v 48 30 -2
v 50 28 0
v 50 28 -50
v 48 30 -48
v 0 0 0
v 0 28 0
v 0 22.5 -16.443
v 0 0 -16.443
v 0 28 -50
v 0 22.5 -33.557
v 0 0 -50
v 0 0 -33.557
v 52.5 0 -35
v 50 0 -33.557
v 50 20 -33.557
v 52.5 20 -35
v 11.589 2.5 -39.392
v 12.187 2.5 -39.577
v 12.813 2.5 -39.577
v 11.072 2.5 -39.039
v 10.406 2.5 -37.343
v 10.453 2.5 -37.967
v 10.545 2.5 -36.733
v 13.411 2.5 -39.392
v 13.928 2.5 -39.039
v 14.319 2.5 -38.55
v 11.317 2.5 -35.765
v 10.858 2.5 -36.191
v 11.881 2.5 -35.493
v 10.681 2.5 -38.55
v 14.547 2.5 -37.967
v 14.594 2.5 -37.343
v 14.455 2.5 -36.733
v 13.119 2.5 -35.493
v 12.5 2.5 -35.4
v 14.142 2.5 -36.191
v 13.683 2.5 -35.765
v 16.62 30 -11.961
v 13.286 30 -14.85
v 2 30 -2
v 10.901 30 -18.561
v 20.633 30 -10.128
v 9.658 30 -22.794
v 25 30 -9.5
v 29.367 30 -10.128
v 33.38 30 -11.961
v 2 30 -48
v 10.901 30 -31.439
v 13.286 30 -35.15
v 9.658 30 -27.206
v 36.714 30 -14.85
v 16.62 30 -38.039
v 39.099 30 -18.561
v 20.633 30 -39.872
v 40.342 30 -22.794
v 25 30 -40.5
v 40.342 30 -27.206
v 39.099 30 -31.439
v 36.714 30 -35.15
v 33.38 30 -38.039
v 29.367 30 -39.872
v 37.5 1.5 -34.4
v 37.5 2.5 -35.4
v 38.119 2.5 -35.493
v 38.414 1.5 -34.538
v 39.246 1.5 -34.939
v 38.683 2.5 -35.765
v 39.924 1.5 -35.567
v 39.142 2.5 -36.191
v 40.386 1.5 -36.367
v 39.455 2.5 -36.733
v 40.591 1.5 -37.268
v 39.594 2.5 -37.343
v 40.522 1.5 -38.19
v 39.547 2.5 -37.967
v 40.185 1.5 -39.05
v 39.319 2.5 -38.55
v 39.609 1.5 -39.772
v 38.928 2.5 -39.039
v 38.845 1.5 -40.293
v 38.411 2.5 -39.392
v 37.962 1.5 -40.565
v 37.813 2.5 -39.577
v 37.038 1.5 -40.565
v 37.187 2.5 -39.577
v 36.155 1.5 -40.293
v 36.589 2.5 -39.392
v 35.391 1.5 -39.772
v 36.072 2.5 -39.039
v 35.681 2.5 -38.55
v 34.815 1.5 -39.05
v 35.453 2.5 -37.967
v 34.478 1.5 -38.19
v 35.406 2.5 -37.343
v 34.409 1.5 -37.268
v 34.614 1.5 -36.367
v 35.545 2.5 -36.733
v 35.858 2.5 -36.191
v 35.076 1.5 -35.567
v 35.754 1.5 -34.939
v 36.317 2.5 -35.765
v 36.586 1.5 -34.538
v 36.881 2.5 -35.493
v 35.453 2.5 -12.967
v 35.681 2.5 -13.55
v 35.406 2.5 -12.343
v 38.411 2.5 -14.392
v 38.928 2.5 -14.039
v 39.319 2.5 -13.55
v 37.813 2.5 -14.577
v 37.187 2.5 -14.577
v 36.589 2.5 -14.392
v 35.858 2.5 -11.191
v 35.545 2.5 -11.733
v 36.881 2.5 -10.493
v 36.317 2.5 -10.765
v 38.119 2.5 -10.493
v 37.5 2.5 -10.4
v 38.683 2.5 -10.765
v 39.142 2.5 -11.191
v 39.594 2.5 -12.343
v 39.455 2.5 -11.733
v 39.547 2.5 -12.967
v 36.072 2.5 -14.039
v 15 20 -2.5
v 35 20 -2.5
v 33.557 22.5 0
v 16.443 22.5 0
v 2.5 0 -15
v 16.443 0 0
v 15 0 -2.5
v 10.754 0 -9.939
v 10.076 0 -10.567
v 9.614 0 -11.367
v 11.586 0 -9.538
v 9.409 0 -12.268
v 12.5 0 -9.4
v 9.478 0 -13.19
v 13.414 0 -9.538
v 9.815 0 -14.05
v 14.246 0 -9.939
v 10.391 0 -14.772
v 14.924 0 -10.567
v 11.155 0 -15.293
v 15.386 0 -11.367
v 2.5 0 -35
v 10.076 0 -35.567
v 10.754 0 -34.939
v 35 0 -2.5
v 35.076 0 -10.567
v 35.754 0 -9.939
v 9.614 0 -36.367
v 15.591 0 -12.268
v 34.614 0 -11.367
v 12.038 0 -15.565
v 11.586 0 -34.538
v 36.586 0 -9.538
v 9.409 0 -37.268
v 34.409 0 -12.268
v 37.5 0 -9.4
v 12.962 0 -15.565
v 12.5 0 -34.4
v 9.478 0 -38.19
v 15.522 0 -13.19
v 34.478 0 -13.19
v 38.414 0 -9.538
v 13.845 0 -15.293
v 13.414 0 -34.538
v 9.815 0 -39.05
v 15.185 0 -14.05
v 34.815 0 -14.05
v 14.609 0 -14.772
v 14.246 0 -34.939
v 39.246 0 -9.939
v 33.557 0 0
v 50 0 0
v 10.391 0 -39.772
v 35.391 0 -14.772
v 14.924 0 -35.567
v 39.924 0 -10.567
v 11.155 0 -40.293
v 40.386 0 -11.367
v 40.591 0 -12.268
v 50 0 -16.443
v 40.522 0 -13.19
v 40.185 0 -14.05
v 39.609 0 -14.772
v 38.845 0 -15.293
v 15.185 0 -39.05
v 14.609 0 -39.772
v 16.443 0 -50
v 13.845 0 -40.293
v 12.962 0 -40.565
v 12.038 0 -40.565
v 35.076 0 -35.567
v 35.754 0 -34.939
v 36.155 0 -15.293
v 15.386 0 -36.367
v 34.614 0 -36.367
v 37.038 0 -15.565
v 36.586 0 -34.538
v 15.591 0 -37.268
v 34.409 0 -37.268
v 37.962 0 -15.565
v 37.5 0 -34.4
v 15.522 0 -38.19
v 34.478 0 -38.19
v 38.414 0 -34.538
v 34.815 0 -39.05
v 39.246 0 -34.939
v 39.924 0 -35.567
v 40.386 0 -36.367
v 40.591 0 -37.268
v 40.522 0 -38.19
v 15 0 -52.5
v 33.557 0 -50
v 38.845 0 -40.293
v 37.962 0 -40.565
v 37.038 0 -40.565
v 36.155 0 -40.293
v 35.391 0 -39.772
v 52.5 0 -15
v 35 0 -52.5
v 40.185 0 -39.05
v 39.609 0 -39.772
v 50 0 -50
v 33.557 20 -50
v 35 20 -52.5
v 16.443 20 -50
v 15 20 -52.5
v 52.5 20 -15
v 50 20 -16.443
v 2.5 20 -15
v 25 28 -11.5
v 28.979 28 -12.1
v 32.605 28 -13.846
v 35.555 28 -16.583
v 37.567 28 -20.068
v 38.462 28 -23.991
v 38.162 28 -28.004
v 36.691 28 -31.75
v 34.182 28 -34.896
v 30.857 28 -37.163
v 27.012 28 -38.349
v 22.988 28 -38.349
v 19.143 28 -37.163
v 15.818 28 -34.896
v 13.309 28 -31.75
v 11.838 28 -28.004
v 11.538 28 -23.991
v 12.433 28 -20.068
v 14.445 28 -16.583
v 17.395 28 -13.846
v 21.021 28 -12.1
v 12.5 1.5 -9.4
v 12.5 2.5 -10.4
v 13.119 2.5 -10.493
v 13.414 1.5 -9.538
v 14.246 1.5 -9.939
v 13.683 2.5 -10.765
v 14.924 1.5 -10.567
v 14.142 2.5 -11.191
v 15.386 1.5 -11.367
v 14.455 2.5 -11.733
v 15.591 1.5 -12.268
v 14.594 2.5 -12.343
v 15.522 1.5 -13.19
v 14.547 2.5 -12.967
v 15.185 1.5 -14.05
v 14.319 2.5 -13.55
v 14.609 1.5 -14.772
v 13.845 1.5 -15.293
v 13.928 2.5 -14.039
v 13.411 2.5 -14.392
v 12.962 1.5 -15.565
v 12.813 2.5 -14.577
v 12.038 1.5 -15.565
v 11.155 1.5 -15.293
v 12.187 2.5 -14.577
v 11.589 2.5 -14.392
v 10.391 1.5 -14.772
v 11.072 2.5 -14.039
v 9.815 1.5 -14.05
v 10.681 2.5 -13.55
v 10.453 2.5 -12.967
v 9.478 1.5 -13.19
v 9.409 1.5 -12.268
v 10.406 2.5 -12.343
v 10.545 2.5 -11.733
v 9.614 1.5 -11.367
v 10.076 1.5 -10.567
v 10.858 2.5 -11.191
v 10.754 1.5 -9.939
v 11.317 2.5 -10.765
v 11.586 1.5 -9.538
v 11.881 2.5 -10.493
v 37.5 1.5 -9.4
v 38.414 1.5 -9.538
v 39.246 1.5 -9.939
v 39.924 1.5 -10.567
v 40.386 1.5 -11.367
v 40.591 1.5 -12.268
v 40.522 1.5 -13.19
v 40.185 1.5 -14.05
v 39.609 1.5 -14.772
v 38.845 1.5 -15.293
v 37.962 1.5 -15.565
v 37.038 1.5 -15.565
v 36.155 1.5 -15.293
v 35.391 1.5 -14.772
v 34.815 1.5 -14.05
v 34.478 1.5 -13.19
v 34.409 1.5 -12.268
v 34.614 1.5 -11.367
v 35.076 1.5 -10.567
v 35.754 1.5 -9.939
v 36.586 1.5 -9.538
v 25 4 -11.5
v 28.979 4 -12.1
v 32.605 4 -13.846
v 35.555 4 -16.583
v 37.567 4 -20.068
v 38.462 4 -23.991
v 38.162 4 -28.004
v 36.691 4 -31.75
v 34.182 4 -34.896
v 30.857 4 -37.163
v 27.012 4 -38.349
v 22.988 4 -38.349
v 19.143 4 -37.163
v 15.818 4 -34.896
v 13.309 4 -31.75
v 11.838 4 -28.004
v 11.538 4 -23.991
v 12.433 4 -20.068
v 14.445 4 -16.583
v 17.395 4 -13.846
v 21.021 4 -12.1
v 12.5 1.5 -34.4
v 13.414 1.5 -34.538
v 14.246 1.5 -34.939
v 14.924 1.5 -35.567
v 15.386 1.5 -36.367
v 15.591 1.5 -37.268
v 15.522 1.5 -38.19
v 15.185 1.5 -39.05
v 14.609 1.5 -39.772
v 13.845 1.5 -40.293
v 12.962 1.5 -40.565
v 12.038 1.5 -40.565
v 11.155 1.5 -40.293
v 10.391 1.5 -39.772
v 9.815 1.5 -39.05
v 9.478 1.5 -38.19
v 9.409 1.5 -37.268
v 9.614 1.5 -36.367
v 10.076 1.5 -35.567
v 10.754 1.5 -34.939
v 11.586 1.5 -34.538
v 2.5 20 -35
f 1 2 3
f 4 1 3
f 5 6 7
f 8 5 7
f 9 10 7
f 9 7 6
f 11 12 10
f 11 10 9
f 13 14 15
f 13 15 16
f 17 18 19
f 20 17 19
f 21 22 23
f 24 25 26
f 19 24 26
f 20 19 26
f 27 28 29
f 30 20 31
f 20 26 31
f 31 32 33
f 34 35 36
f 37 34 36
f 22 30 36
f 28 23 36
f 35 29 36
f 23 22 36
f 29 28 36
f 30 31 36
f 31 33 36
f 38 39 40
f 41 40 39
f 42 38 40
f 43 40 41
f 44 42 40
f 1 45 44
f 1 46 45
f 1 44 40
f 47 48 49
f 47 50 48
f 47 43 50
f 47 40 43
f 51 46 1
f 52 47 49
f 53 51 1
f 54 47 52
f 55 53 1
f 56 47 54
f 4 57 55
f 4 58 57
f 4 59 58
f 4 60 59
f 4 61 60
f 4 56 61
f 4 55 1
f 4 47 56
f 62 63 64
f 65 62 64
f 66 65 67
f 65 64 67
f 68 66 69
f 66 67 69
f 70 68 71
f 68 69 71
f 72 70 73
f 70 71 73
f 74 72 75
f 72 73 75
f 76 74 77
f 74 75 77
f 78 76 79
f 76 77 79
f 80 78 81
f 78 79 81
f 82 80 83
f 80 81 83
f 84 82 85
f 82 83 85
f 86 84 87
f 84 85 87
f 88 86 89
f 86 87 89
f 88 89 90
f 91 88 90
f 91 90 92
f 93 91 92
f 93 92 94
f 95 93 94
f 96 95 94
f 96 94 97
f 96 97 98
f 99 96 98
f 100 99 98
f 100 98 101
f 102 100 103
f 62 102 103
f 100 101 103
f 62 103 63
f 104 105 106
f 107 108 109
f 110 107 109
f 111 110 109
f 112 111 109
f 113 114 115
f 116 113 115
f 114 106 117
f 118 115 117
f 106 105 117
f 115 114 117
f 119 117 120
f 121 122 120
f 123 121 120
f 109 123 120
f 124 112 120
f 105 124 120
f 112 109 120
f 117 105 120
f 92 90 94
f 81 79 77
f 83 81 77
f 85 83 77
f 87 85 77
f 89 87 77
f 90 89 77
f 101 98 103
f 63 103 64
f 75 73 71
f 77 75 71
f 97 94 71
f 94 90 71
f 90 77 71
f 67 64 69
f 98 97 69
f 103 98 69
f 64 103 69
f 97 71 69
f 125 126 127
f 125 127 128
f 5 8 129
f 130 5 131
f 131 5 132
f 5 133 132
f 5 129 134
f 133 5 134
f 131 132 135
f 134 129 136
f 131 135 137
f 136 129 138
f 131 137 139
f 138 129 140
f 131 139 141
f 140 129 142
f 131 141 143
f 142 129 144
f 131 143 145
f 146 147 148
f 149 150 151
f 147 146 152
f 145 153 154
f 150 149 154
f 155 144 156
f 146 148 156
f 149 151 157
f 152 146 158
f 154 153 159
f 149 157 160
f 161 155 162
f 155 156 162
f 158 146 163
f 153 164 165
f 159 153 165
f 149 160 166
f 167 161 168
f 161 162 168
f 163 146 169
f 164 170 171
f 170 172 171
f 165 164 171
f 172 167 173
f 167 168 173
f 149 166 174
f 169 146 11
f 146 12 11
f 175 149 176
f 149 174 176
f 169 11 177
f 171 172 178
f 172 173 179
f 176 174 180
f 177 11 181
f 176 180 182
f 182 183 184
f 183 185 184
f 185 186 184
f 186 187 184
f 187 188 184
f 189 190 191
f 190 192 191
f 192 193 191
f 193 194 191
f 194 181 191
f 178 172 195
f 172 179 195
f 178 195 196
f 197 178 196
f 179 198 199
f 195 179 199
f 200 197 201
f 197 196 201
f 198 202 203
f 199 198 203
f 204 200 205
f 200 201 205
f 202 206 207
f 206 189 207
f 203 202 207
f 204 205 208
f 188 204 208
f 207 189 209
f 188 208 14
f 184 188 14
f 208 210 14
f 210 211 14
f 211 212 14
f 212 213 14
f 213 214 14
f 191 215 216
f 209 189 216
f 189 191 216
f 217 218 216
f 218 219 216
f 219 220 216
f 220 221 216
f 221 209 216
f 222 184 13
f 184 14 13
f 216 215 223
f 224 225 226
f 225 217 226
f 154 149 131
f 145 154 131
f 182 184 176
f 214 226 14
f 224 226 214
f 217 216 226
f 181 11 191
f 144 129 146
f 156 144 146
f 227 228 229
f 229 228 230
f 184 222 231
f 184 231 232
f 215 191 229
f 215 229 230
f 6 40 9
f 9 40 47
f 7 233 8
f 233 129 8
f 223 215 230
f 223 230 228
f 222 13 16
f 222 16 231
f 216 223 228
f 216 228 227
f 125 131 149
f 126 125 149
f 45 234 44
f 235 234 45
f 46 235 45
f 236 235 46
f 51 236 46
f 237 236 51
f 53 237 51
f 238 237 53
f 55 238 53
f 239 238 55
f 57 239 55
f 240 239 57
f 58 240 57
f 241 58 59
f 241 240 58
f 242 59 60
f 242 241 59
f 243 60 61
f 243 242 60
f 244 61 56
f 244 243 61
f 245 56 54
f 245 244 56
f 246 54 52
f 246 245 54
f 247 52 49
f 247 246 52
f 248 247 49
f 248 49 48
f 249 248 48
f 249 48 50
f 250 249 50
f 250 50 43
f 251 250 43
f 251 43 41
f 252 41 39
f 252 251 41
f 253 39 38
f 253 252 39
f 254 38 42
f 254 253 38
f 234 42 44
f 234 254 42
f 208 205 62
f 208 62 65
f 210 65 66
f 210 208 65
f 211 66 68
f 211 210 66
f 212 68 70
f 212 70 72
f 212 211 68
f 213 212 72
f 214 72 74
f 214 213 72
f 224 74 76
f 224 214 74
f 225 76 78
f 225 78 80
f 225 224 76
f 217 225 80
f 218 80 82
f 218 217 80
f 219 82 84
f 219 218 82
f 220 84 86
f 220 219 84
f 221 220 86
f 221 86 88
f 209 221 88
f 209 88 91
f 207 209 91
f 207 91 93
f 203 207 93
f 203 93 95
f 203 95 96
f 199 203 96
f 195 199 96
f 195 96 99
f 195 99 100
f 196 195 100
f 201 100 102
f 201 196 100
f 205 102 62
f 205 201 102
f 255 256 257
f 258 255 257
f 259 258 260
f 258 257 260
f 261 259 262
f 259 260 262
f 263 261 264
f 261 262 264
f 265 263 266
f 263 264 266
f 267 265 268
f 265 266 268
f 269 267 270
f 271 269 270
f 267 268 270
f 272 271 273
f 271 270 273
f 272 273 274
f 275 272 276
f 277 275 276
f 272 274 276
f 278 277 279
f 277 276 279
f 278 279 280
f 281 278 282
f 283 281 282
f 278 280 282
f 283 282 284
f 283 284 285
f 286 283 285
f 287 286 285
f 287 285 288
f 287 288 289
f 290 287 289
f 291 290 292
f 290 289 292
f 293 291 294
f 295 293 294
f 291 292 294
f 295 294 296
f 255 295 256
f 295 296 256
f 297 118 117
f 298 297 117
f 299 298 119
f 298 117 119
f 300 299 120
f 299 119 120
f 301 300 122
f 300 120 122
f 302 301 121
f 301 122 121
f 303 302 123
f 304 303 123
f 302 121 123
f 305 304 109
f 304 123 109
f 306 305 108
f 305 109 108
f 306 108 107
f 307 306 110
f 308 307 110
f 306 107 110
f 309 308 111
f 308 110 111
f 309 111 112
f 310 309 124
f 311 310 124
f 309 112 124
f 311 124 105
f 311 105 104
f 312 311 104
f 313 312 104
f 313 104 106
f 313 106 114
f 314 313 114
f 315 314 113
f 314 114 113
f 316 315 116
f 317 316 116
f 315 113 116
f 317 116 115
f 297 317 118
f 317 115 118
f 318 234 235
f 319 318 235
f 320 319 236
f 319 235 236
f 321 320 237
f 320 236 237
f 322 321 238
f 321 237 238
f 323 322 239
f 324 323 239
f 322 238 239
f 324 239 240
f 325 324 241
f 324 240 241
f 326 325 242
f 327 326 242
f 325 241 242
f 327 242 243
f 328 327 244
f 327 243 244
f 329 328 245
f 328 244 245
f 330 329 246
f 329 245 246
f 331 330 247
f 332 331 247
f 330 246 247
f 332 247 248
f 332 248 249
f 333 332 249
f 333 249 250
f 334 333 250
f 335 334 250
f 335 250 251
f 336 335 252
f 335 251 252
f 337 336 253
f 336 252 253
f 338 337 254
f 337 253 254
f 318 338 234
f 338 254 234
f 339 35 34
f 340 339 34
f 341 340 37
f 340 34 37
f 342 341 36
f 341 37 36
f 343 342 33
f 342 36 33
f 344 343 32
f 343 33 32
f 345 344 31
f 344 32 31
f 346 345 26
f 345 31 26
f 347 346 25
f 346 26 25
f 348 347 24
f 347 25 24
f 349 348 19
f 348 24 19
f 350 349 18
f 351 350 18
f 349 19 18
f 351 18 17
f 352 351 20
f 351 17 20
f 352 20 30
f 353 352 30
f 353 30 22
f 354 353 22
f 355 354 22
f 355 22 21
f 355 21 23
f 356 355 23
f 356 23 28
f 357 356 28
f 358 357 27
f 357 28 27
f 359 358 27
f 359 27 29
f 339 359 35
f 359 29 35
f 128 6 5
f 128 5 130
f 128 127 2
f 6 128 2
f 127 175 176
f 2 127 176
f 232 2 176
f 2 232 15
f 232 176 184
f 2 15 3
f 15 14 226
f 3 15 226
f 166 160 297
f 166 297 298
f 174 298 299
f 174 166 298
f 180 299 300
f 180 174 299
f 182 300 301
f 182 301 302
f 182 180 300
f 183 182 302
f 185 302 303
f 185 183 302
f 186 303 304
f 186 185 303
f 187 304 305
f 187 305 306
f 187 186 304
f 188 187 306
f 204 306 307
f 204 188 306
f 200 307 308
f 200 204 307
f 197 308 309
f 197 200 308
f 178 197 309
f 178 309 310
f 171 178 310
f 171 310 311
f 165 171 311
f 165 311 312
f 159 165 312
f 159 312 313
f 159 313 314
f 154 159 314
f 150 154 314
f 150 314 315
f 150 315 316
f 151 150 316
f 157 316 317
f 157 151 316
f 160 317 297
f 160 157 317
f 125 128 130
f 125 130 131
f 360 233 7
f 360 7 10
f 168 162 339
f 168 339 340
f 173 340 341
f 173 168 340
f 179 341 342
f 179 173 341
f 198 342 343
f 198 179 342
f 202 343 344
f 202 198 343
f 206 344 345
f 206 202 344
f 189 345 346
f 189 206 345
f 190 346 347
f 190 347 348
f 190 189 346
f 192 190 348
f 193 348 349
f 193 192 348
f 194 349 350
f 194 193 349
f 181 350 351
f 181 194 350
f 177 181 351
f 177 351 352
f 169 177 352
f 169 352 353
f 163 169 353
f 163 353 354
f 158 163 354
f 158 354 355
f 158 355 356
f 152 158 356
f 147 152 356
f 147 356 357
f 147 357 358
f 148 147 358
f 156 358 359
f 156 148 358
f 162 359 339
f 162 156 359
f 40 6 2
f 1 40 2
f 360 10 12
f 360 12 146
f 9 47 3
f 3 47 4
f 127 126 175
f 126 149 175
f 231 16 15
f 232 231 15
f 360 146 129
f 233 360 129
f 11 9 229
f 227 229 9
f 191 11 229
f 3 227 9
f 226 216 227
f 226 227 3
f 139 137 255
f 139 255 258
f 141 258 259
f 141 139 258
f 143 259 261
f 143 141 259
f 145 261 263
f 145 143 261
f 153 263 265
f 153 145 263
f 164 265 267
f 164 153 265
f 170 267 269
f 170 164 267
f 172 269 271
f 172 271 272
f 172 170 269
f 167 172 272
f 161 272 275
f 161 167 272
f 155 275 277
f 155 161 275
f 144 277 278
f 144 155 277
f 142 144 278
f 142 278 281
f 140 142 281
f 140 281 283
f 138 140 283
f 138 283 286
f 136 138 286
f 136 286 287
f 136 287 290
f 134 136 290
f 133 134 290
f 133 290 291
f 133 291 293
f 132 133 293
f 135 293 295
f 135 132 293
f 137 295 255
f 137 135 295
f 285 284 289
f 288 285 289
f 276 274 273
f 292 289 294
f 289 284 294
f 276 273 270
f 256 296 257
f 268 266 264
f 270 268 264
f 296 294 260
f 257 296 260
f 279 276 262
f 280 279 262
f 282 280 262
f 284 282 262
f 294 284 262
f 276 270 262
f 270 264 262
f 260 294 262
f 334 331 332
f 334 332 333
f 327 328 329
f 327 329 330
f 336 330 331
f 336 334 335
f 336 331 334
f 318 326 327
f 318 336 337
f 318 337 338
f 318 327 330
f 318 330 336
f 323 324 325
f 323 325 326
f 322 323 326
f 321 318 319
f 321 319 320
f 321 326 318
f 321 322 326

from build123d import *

# Parameters (mm, degrees)
SKETCH1_W           = 50
SKETCH1_H           = 50
BOSS_EXTRUDE1_DEPTH = 30
SKETCH2_R           = 13.5
CUT_EXTRUDE1_DEPTH  = 26
BOSS_EXTRUDE2_DEPTH = 20
BOSS_EXTRUDE3_DEPTH = 20
CUT_EXTRUDE2_DEPTH  = 20
CUT_EXTRUDE3_DEPTH  = 20
CHAMFER1_SIZE       = 2
SKETCH4_R           = 3.1
CUT_EXTRUDE4_DEPTH  = 2.5
CHAMFER2_SIZE       = 1
CHAMFER3_SIZE       = 2.5


with BuildPart() as part:
    # Sketch1 → Boss-Extrude1 (new body)
    with BuildSketch(Plane(origin=(0, 0, 0), x_dir=(1, 0, 0), z_dir=(0, 1, 0))):
        with Locations((25, 25)):
            Rectangle(SKETCH1_W, SKETCH1_H)
    extrude(amount=BOSS_EXTRUDE1_DEPTH)

    # Sketch2 → Cut-Extrude1 (cut)
    with BuildSketch(Plane(origin=(0, 30, 0), x_dir=(1, 0, 0), z_dir=(0, 1, 0))):
        with Locations(Location((25, 25, 0), (0, 0, 270))):
            Circle(SKETCH2_R)
    extrude(amount=-CUT_EXTRUDE1_DEPTH, mode=Mode.SUBTRACT)

    # Sketch3 → Boss-Extrude2 (add)
    with BuildSketch(Plane(origin=(0, 0, 0), x_dir=(1, 0, 0), z_dir=(0, 1, 0))):
        Polygon((50, 33.556624327), (52.5, 35), (52.5, 15), (50, 16.443375673), align=None)
    extrude(amount=BOSS_EXTRUDE2_DEPTH)

    # Sketch3<3> → Boss-Extrude3 (add)
    with BuildSketch(Plane(origin=(0, 0, 0), x_dir=(1, 0, 0), z_dir=(0, 1, 0))):
        Polygon((16.443375673, 50), (15, 52.5), (35, 52.5), (33.556624327, 50), align=None)
    extrude(amount=BOSS_EXTRUDE3_DEPTH)

    # Sketch3<4> → Cut-Extrude2 (cut)
    with BuildSketch(Plane(origin=(0, 0, 0), x_dir=(1, 0, 0), z_dir=(0, 1, 0))):
        Polygon((0, 33.556624327), (2.5, 35), (2.5, 15), (0, 16.443375673), align=None)
    extrude(amount=CUT_EXTRUDE2_DEPTH, mode=Mode.SUBTRACT)

    # Sketch3<5> → Cut-Extrude3 (cut)
    with BuildSketch(Plane(origin=(0, 0, 0), x_dir=(1, 0, 0), z_dir=(0, 1, 0))):
        Polygon((16.443375673, 0), (15, 2.5), (35, 2.5), (33.556624327, 0), align=None)
    extrude(amount=CUT_EXTRUDE3_DEPTH, mode=Mode.SUBTRACT)

    # Chamfer1
    chamfer1_edges = [part.edges().sort_by_distance(p)[0] for p in [
        (50, 30, -25),
        (25, 30, -38.5),
        (25, 30, -50),
        (0, 30, -25),
        (25, 30, 0),
    ]]
    chamfer(chamfer1_edges, length=CHAMFER1_SIZE)

    # Sketch4 → Cut-Extrude4 (cut)
    with BuildSketch(Plane(origin=(0, 0, 0), x_dir=(1, 0, 0), z_dir=(0, 1, 0))):
        with Locations(Location((12.5, 37.5, 0), (0, 0, 270))):
            Circle(SKETCH4_R)
        with Locations(Location((37.5, 37.5, 0), (0, 0, 270))):
            Circle(SKETCH4_R)
        with Locations(Location((37.5, 12.5, 0), (0, 0, 270))):
            Circle(SKETCH4_R)
        with Locations(Location((12.5, 12.5, 0), (0, 0, 270))):
            Circle(SKETCH4_R)
    extrude(amount=CUT_EXTRUDE4_DEPTH, mode=Mode.SUBTRACT)

    # Chamfer2
    chamfer2_edges = [part.edges().sort_by_distance(p)[0] for p in [
        (12.5, 2.5, -40.6),
        (12.5, 2.5, -15.6),
        (37.5, 2.5, -15.6),
        (37.5, 2.5, -40.6),
    ]]
    chamfer(chamfer2_edges, length=CHAMFER2_SIZE)

    # Chamfer3
    chamfer3_edges = [part.edges().sort_by_distance(p)[0] for p in [
        (0, 20, -25),
        (25, 20, 0),
    ]]
    chamfer(chamfer3_edges, length=CHAMFER3_SIZE - 0.0001)  # a hair under: the kernel refuses the full size


solid = part.part
